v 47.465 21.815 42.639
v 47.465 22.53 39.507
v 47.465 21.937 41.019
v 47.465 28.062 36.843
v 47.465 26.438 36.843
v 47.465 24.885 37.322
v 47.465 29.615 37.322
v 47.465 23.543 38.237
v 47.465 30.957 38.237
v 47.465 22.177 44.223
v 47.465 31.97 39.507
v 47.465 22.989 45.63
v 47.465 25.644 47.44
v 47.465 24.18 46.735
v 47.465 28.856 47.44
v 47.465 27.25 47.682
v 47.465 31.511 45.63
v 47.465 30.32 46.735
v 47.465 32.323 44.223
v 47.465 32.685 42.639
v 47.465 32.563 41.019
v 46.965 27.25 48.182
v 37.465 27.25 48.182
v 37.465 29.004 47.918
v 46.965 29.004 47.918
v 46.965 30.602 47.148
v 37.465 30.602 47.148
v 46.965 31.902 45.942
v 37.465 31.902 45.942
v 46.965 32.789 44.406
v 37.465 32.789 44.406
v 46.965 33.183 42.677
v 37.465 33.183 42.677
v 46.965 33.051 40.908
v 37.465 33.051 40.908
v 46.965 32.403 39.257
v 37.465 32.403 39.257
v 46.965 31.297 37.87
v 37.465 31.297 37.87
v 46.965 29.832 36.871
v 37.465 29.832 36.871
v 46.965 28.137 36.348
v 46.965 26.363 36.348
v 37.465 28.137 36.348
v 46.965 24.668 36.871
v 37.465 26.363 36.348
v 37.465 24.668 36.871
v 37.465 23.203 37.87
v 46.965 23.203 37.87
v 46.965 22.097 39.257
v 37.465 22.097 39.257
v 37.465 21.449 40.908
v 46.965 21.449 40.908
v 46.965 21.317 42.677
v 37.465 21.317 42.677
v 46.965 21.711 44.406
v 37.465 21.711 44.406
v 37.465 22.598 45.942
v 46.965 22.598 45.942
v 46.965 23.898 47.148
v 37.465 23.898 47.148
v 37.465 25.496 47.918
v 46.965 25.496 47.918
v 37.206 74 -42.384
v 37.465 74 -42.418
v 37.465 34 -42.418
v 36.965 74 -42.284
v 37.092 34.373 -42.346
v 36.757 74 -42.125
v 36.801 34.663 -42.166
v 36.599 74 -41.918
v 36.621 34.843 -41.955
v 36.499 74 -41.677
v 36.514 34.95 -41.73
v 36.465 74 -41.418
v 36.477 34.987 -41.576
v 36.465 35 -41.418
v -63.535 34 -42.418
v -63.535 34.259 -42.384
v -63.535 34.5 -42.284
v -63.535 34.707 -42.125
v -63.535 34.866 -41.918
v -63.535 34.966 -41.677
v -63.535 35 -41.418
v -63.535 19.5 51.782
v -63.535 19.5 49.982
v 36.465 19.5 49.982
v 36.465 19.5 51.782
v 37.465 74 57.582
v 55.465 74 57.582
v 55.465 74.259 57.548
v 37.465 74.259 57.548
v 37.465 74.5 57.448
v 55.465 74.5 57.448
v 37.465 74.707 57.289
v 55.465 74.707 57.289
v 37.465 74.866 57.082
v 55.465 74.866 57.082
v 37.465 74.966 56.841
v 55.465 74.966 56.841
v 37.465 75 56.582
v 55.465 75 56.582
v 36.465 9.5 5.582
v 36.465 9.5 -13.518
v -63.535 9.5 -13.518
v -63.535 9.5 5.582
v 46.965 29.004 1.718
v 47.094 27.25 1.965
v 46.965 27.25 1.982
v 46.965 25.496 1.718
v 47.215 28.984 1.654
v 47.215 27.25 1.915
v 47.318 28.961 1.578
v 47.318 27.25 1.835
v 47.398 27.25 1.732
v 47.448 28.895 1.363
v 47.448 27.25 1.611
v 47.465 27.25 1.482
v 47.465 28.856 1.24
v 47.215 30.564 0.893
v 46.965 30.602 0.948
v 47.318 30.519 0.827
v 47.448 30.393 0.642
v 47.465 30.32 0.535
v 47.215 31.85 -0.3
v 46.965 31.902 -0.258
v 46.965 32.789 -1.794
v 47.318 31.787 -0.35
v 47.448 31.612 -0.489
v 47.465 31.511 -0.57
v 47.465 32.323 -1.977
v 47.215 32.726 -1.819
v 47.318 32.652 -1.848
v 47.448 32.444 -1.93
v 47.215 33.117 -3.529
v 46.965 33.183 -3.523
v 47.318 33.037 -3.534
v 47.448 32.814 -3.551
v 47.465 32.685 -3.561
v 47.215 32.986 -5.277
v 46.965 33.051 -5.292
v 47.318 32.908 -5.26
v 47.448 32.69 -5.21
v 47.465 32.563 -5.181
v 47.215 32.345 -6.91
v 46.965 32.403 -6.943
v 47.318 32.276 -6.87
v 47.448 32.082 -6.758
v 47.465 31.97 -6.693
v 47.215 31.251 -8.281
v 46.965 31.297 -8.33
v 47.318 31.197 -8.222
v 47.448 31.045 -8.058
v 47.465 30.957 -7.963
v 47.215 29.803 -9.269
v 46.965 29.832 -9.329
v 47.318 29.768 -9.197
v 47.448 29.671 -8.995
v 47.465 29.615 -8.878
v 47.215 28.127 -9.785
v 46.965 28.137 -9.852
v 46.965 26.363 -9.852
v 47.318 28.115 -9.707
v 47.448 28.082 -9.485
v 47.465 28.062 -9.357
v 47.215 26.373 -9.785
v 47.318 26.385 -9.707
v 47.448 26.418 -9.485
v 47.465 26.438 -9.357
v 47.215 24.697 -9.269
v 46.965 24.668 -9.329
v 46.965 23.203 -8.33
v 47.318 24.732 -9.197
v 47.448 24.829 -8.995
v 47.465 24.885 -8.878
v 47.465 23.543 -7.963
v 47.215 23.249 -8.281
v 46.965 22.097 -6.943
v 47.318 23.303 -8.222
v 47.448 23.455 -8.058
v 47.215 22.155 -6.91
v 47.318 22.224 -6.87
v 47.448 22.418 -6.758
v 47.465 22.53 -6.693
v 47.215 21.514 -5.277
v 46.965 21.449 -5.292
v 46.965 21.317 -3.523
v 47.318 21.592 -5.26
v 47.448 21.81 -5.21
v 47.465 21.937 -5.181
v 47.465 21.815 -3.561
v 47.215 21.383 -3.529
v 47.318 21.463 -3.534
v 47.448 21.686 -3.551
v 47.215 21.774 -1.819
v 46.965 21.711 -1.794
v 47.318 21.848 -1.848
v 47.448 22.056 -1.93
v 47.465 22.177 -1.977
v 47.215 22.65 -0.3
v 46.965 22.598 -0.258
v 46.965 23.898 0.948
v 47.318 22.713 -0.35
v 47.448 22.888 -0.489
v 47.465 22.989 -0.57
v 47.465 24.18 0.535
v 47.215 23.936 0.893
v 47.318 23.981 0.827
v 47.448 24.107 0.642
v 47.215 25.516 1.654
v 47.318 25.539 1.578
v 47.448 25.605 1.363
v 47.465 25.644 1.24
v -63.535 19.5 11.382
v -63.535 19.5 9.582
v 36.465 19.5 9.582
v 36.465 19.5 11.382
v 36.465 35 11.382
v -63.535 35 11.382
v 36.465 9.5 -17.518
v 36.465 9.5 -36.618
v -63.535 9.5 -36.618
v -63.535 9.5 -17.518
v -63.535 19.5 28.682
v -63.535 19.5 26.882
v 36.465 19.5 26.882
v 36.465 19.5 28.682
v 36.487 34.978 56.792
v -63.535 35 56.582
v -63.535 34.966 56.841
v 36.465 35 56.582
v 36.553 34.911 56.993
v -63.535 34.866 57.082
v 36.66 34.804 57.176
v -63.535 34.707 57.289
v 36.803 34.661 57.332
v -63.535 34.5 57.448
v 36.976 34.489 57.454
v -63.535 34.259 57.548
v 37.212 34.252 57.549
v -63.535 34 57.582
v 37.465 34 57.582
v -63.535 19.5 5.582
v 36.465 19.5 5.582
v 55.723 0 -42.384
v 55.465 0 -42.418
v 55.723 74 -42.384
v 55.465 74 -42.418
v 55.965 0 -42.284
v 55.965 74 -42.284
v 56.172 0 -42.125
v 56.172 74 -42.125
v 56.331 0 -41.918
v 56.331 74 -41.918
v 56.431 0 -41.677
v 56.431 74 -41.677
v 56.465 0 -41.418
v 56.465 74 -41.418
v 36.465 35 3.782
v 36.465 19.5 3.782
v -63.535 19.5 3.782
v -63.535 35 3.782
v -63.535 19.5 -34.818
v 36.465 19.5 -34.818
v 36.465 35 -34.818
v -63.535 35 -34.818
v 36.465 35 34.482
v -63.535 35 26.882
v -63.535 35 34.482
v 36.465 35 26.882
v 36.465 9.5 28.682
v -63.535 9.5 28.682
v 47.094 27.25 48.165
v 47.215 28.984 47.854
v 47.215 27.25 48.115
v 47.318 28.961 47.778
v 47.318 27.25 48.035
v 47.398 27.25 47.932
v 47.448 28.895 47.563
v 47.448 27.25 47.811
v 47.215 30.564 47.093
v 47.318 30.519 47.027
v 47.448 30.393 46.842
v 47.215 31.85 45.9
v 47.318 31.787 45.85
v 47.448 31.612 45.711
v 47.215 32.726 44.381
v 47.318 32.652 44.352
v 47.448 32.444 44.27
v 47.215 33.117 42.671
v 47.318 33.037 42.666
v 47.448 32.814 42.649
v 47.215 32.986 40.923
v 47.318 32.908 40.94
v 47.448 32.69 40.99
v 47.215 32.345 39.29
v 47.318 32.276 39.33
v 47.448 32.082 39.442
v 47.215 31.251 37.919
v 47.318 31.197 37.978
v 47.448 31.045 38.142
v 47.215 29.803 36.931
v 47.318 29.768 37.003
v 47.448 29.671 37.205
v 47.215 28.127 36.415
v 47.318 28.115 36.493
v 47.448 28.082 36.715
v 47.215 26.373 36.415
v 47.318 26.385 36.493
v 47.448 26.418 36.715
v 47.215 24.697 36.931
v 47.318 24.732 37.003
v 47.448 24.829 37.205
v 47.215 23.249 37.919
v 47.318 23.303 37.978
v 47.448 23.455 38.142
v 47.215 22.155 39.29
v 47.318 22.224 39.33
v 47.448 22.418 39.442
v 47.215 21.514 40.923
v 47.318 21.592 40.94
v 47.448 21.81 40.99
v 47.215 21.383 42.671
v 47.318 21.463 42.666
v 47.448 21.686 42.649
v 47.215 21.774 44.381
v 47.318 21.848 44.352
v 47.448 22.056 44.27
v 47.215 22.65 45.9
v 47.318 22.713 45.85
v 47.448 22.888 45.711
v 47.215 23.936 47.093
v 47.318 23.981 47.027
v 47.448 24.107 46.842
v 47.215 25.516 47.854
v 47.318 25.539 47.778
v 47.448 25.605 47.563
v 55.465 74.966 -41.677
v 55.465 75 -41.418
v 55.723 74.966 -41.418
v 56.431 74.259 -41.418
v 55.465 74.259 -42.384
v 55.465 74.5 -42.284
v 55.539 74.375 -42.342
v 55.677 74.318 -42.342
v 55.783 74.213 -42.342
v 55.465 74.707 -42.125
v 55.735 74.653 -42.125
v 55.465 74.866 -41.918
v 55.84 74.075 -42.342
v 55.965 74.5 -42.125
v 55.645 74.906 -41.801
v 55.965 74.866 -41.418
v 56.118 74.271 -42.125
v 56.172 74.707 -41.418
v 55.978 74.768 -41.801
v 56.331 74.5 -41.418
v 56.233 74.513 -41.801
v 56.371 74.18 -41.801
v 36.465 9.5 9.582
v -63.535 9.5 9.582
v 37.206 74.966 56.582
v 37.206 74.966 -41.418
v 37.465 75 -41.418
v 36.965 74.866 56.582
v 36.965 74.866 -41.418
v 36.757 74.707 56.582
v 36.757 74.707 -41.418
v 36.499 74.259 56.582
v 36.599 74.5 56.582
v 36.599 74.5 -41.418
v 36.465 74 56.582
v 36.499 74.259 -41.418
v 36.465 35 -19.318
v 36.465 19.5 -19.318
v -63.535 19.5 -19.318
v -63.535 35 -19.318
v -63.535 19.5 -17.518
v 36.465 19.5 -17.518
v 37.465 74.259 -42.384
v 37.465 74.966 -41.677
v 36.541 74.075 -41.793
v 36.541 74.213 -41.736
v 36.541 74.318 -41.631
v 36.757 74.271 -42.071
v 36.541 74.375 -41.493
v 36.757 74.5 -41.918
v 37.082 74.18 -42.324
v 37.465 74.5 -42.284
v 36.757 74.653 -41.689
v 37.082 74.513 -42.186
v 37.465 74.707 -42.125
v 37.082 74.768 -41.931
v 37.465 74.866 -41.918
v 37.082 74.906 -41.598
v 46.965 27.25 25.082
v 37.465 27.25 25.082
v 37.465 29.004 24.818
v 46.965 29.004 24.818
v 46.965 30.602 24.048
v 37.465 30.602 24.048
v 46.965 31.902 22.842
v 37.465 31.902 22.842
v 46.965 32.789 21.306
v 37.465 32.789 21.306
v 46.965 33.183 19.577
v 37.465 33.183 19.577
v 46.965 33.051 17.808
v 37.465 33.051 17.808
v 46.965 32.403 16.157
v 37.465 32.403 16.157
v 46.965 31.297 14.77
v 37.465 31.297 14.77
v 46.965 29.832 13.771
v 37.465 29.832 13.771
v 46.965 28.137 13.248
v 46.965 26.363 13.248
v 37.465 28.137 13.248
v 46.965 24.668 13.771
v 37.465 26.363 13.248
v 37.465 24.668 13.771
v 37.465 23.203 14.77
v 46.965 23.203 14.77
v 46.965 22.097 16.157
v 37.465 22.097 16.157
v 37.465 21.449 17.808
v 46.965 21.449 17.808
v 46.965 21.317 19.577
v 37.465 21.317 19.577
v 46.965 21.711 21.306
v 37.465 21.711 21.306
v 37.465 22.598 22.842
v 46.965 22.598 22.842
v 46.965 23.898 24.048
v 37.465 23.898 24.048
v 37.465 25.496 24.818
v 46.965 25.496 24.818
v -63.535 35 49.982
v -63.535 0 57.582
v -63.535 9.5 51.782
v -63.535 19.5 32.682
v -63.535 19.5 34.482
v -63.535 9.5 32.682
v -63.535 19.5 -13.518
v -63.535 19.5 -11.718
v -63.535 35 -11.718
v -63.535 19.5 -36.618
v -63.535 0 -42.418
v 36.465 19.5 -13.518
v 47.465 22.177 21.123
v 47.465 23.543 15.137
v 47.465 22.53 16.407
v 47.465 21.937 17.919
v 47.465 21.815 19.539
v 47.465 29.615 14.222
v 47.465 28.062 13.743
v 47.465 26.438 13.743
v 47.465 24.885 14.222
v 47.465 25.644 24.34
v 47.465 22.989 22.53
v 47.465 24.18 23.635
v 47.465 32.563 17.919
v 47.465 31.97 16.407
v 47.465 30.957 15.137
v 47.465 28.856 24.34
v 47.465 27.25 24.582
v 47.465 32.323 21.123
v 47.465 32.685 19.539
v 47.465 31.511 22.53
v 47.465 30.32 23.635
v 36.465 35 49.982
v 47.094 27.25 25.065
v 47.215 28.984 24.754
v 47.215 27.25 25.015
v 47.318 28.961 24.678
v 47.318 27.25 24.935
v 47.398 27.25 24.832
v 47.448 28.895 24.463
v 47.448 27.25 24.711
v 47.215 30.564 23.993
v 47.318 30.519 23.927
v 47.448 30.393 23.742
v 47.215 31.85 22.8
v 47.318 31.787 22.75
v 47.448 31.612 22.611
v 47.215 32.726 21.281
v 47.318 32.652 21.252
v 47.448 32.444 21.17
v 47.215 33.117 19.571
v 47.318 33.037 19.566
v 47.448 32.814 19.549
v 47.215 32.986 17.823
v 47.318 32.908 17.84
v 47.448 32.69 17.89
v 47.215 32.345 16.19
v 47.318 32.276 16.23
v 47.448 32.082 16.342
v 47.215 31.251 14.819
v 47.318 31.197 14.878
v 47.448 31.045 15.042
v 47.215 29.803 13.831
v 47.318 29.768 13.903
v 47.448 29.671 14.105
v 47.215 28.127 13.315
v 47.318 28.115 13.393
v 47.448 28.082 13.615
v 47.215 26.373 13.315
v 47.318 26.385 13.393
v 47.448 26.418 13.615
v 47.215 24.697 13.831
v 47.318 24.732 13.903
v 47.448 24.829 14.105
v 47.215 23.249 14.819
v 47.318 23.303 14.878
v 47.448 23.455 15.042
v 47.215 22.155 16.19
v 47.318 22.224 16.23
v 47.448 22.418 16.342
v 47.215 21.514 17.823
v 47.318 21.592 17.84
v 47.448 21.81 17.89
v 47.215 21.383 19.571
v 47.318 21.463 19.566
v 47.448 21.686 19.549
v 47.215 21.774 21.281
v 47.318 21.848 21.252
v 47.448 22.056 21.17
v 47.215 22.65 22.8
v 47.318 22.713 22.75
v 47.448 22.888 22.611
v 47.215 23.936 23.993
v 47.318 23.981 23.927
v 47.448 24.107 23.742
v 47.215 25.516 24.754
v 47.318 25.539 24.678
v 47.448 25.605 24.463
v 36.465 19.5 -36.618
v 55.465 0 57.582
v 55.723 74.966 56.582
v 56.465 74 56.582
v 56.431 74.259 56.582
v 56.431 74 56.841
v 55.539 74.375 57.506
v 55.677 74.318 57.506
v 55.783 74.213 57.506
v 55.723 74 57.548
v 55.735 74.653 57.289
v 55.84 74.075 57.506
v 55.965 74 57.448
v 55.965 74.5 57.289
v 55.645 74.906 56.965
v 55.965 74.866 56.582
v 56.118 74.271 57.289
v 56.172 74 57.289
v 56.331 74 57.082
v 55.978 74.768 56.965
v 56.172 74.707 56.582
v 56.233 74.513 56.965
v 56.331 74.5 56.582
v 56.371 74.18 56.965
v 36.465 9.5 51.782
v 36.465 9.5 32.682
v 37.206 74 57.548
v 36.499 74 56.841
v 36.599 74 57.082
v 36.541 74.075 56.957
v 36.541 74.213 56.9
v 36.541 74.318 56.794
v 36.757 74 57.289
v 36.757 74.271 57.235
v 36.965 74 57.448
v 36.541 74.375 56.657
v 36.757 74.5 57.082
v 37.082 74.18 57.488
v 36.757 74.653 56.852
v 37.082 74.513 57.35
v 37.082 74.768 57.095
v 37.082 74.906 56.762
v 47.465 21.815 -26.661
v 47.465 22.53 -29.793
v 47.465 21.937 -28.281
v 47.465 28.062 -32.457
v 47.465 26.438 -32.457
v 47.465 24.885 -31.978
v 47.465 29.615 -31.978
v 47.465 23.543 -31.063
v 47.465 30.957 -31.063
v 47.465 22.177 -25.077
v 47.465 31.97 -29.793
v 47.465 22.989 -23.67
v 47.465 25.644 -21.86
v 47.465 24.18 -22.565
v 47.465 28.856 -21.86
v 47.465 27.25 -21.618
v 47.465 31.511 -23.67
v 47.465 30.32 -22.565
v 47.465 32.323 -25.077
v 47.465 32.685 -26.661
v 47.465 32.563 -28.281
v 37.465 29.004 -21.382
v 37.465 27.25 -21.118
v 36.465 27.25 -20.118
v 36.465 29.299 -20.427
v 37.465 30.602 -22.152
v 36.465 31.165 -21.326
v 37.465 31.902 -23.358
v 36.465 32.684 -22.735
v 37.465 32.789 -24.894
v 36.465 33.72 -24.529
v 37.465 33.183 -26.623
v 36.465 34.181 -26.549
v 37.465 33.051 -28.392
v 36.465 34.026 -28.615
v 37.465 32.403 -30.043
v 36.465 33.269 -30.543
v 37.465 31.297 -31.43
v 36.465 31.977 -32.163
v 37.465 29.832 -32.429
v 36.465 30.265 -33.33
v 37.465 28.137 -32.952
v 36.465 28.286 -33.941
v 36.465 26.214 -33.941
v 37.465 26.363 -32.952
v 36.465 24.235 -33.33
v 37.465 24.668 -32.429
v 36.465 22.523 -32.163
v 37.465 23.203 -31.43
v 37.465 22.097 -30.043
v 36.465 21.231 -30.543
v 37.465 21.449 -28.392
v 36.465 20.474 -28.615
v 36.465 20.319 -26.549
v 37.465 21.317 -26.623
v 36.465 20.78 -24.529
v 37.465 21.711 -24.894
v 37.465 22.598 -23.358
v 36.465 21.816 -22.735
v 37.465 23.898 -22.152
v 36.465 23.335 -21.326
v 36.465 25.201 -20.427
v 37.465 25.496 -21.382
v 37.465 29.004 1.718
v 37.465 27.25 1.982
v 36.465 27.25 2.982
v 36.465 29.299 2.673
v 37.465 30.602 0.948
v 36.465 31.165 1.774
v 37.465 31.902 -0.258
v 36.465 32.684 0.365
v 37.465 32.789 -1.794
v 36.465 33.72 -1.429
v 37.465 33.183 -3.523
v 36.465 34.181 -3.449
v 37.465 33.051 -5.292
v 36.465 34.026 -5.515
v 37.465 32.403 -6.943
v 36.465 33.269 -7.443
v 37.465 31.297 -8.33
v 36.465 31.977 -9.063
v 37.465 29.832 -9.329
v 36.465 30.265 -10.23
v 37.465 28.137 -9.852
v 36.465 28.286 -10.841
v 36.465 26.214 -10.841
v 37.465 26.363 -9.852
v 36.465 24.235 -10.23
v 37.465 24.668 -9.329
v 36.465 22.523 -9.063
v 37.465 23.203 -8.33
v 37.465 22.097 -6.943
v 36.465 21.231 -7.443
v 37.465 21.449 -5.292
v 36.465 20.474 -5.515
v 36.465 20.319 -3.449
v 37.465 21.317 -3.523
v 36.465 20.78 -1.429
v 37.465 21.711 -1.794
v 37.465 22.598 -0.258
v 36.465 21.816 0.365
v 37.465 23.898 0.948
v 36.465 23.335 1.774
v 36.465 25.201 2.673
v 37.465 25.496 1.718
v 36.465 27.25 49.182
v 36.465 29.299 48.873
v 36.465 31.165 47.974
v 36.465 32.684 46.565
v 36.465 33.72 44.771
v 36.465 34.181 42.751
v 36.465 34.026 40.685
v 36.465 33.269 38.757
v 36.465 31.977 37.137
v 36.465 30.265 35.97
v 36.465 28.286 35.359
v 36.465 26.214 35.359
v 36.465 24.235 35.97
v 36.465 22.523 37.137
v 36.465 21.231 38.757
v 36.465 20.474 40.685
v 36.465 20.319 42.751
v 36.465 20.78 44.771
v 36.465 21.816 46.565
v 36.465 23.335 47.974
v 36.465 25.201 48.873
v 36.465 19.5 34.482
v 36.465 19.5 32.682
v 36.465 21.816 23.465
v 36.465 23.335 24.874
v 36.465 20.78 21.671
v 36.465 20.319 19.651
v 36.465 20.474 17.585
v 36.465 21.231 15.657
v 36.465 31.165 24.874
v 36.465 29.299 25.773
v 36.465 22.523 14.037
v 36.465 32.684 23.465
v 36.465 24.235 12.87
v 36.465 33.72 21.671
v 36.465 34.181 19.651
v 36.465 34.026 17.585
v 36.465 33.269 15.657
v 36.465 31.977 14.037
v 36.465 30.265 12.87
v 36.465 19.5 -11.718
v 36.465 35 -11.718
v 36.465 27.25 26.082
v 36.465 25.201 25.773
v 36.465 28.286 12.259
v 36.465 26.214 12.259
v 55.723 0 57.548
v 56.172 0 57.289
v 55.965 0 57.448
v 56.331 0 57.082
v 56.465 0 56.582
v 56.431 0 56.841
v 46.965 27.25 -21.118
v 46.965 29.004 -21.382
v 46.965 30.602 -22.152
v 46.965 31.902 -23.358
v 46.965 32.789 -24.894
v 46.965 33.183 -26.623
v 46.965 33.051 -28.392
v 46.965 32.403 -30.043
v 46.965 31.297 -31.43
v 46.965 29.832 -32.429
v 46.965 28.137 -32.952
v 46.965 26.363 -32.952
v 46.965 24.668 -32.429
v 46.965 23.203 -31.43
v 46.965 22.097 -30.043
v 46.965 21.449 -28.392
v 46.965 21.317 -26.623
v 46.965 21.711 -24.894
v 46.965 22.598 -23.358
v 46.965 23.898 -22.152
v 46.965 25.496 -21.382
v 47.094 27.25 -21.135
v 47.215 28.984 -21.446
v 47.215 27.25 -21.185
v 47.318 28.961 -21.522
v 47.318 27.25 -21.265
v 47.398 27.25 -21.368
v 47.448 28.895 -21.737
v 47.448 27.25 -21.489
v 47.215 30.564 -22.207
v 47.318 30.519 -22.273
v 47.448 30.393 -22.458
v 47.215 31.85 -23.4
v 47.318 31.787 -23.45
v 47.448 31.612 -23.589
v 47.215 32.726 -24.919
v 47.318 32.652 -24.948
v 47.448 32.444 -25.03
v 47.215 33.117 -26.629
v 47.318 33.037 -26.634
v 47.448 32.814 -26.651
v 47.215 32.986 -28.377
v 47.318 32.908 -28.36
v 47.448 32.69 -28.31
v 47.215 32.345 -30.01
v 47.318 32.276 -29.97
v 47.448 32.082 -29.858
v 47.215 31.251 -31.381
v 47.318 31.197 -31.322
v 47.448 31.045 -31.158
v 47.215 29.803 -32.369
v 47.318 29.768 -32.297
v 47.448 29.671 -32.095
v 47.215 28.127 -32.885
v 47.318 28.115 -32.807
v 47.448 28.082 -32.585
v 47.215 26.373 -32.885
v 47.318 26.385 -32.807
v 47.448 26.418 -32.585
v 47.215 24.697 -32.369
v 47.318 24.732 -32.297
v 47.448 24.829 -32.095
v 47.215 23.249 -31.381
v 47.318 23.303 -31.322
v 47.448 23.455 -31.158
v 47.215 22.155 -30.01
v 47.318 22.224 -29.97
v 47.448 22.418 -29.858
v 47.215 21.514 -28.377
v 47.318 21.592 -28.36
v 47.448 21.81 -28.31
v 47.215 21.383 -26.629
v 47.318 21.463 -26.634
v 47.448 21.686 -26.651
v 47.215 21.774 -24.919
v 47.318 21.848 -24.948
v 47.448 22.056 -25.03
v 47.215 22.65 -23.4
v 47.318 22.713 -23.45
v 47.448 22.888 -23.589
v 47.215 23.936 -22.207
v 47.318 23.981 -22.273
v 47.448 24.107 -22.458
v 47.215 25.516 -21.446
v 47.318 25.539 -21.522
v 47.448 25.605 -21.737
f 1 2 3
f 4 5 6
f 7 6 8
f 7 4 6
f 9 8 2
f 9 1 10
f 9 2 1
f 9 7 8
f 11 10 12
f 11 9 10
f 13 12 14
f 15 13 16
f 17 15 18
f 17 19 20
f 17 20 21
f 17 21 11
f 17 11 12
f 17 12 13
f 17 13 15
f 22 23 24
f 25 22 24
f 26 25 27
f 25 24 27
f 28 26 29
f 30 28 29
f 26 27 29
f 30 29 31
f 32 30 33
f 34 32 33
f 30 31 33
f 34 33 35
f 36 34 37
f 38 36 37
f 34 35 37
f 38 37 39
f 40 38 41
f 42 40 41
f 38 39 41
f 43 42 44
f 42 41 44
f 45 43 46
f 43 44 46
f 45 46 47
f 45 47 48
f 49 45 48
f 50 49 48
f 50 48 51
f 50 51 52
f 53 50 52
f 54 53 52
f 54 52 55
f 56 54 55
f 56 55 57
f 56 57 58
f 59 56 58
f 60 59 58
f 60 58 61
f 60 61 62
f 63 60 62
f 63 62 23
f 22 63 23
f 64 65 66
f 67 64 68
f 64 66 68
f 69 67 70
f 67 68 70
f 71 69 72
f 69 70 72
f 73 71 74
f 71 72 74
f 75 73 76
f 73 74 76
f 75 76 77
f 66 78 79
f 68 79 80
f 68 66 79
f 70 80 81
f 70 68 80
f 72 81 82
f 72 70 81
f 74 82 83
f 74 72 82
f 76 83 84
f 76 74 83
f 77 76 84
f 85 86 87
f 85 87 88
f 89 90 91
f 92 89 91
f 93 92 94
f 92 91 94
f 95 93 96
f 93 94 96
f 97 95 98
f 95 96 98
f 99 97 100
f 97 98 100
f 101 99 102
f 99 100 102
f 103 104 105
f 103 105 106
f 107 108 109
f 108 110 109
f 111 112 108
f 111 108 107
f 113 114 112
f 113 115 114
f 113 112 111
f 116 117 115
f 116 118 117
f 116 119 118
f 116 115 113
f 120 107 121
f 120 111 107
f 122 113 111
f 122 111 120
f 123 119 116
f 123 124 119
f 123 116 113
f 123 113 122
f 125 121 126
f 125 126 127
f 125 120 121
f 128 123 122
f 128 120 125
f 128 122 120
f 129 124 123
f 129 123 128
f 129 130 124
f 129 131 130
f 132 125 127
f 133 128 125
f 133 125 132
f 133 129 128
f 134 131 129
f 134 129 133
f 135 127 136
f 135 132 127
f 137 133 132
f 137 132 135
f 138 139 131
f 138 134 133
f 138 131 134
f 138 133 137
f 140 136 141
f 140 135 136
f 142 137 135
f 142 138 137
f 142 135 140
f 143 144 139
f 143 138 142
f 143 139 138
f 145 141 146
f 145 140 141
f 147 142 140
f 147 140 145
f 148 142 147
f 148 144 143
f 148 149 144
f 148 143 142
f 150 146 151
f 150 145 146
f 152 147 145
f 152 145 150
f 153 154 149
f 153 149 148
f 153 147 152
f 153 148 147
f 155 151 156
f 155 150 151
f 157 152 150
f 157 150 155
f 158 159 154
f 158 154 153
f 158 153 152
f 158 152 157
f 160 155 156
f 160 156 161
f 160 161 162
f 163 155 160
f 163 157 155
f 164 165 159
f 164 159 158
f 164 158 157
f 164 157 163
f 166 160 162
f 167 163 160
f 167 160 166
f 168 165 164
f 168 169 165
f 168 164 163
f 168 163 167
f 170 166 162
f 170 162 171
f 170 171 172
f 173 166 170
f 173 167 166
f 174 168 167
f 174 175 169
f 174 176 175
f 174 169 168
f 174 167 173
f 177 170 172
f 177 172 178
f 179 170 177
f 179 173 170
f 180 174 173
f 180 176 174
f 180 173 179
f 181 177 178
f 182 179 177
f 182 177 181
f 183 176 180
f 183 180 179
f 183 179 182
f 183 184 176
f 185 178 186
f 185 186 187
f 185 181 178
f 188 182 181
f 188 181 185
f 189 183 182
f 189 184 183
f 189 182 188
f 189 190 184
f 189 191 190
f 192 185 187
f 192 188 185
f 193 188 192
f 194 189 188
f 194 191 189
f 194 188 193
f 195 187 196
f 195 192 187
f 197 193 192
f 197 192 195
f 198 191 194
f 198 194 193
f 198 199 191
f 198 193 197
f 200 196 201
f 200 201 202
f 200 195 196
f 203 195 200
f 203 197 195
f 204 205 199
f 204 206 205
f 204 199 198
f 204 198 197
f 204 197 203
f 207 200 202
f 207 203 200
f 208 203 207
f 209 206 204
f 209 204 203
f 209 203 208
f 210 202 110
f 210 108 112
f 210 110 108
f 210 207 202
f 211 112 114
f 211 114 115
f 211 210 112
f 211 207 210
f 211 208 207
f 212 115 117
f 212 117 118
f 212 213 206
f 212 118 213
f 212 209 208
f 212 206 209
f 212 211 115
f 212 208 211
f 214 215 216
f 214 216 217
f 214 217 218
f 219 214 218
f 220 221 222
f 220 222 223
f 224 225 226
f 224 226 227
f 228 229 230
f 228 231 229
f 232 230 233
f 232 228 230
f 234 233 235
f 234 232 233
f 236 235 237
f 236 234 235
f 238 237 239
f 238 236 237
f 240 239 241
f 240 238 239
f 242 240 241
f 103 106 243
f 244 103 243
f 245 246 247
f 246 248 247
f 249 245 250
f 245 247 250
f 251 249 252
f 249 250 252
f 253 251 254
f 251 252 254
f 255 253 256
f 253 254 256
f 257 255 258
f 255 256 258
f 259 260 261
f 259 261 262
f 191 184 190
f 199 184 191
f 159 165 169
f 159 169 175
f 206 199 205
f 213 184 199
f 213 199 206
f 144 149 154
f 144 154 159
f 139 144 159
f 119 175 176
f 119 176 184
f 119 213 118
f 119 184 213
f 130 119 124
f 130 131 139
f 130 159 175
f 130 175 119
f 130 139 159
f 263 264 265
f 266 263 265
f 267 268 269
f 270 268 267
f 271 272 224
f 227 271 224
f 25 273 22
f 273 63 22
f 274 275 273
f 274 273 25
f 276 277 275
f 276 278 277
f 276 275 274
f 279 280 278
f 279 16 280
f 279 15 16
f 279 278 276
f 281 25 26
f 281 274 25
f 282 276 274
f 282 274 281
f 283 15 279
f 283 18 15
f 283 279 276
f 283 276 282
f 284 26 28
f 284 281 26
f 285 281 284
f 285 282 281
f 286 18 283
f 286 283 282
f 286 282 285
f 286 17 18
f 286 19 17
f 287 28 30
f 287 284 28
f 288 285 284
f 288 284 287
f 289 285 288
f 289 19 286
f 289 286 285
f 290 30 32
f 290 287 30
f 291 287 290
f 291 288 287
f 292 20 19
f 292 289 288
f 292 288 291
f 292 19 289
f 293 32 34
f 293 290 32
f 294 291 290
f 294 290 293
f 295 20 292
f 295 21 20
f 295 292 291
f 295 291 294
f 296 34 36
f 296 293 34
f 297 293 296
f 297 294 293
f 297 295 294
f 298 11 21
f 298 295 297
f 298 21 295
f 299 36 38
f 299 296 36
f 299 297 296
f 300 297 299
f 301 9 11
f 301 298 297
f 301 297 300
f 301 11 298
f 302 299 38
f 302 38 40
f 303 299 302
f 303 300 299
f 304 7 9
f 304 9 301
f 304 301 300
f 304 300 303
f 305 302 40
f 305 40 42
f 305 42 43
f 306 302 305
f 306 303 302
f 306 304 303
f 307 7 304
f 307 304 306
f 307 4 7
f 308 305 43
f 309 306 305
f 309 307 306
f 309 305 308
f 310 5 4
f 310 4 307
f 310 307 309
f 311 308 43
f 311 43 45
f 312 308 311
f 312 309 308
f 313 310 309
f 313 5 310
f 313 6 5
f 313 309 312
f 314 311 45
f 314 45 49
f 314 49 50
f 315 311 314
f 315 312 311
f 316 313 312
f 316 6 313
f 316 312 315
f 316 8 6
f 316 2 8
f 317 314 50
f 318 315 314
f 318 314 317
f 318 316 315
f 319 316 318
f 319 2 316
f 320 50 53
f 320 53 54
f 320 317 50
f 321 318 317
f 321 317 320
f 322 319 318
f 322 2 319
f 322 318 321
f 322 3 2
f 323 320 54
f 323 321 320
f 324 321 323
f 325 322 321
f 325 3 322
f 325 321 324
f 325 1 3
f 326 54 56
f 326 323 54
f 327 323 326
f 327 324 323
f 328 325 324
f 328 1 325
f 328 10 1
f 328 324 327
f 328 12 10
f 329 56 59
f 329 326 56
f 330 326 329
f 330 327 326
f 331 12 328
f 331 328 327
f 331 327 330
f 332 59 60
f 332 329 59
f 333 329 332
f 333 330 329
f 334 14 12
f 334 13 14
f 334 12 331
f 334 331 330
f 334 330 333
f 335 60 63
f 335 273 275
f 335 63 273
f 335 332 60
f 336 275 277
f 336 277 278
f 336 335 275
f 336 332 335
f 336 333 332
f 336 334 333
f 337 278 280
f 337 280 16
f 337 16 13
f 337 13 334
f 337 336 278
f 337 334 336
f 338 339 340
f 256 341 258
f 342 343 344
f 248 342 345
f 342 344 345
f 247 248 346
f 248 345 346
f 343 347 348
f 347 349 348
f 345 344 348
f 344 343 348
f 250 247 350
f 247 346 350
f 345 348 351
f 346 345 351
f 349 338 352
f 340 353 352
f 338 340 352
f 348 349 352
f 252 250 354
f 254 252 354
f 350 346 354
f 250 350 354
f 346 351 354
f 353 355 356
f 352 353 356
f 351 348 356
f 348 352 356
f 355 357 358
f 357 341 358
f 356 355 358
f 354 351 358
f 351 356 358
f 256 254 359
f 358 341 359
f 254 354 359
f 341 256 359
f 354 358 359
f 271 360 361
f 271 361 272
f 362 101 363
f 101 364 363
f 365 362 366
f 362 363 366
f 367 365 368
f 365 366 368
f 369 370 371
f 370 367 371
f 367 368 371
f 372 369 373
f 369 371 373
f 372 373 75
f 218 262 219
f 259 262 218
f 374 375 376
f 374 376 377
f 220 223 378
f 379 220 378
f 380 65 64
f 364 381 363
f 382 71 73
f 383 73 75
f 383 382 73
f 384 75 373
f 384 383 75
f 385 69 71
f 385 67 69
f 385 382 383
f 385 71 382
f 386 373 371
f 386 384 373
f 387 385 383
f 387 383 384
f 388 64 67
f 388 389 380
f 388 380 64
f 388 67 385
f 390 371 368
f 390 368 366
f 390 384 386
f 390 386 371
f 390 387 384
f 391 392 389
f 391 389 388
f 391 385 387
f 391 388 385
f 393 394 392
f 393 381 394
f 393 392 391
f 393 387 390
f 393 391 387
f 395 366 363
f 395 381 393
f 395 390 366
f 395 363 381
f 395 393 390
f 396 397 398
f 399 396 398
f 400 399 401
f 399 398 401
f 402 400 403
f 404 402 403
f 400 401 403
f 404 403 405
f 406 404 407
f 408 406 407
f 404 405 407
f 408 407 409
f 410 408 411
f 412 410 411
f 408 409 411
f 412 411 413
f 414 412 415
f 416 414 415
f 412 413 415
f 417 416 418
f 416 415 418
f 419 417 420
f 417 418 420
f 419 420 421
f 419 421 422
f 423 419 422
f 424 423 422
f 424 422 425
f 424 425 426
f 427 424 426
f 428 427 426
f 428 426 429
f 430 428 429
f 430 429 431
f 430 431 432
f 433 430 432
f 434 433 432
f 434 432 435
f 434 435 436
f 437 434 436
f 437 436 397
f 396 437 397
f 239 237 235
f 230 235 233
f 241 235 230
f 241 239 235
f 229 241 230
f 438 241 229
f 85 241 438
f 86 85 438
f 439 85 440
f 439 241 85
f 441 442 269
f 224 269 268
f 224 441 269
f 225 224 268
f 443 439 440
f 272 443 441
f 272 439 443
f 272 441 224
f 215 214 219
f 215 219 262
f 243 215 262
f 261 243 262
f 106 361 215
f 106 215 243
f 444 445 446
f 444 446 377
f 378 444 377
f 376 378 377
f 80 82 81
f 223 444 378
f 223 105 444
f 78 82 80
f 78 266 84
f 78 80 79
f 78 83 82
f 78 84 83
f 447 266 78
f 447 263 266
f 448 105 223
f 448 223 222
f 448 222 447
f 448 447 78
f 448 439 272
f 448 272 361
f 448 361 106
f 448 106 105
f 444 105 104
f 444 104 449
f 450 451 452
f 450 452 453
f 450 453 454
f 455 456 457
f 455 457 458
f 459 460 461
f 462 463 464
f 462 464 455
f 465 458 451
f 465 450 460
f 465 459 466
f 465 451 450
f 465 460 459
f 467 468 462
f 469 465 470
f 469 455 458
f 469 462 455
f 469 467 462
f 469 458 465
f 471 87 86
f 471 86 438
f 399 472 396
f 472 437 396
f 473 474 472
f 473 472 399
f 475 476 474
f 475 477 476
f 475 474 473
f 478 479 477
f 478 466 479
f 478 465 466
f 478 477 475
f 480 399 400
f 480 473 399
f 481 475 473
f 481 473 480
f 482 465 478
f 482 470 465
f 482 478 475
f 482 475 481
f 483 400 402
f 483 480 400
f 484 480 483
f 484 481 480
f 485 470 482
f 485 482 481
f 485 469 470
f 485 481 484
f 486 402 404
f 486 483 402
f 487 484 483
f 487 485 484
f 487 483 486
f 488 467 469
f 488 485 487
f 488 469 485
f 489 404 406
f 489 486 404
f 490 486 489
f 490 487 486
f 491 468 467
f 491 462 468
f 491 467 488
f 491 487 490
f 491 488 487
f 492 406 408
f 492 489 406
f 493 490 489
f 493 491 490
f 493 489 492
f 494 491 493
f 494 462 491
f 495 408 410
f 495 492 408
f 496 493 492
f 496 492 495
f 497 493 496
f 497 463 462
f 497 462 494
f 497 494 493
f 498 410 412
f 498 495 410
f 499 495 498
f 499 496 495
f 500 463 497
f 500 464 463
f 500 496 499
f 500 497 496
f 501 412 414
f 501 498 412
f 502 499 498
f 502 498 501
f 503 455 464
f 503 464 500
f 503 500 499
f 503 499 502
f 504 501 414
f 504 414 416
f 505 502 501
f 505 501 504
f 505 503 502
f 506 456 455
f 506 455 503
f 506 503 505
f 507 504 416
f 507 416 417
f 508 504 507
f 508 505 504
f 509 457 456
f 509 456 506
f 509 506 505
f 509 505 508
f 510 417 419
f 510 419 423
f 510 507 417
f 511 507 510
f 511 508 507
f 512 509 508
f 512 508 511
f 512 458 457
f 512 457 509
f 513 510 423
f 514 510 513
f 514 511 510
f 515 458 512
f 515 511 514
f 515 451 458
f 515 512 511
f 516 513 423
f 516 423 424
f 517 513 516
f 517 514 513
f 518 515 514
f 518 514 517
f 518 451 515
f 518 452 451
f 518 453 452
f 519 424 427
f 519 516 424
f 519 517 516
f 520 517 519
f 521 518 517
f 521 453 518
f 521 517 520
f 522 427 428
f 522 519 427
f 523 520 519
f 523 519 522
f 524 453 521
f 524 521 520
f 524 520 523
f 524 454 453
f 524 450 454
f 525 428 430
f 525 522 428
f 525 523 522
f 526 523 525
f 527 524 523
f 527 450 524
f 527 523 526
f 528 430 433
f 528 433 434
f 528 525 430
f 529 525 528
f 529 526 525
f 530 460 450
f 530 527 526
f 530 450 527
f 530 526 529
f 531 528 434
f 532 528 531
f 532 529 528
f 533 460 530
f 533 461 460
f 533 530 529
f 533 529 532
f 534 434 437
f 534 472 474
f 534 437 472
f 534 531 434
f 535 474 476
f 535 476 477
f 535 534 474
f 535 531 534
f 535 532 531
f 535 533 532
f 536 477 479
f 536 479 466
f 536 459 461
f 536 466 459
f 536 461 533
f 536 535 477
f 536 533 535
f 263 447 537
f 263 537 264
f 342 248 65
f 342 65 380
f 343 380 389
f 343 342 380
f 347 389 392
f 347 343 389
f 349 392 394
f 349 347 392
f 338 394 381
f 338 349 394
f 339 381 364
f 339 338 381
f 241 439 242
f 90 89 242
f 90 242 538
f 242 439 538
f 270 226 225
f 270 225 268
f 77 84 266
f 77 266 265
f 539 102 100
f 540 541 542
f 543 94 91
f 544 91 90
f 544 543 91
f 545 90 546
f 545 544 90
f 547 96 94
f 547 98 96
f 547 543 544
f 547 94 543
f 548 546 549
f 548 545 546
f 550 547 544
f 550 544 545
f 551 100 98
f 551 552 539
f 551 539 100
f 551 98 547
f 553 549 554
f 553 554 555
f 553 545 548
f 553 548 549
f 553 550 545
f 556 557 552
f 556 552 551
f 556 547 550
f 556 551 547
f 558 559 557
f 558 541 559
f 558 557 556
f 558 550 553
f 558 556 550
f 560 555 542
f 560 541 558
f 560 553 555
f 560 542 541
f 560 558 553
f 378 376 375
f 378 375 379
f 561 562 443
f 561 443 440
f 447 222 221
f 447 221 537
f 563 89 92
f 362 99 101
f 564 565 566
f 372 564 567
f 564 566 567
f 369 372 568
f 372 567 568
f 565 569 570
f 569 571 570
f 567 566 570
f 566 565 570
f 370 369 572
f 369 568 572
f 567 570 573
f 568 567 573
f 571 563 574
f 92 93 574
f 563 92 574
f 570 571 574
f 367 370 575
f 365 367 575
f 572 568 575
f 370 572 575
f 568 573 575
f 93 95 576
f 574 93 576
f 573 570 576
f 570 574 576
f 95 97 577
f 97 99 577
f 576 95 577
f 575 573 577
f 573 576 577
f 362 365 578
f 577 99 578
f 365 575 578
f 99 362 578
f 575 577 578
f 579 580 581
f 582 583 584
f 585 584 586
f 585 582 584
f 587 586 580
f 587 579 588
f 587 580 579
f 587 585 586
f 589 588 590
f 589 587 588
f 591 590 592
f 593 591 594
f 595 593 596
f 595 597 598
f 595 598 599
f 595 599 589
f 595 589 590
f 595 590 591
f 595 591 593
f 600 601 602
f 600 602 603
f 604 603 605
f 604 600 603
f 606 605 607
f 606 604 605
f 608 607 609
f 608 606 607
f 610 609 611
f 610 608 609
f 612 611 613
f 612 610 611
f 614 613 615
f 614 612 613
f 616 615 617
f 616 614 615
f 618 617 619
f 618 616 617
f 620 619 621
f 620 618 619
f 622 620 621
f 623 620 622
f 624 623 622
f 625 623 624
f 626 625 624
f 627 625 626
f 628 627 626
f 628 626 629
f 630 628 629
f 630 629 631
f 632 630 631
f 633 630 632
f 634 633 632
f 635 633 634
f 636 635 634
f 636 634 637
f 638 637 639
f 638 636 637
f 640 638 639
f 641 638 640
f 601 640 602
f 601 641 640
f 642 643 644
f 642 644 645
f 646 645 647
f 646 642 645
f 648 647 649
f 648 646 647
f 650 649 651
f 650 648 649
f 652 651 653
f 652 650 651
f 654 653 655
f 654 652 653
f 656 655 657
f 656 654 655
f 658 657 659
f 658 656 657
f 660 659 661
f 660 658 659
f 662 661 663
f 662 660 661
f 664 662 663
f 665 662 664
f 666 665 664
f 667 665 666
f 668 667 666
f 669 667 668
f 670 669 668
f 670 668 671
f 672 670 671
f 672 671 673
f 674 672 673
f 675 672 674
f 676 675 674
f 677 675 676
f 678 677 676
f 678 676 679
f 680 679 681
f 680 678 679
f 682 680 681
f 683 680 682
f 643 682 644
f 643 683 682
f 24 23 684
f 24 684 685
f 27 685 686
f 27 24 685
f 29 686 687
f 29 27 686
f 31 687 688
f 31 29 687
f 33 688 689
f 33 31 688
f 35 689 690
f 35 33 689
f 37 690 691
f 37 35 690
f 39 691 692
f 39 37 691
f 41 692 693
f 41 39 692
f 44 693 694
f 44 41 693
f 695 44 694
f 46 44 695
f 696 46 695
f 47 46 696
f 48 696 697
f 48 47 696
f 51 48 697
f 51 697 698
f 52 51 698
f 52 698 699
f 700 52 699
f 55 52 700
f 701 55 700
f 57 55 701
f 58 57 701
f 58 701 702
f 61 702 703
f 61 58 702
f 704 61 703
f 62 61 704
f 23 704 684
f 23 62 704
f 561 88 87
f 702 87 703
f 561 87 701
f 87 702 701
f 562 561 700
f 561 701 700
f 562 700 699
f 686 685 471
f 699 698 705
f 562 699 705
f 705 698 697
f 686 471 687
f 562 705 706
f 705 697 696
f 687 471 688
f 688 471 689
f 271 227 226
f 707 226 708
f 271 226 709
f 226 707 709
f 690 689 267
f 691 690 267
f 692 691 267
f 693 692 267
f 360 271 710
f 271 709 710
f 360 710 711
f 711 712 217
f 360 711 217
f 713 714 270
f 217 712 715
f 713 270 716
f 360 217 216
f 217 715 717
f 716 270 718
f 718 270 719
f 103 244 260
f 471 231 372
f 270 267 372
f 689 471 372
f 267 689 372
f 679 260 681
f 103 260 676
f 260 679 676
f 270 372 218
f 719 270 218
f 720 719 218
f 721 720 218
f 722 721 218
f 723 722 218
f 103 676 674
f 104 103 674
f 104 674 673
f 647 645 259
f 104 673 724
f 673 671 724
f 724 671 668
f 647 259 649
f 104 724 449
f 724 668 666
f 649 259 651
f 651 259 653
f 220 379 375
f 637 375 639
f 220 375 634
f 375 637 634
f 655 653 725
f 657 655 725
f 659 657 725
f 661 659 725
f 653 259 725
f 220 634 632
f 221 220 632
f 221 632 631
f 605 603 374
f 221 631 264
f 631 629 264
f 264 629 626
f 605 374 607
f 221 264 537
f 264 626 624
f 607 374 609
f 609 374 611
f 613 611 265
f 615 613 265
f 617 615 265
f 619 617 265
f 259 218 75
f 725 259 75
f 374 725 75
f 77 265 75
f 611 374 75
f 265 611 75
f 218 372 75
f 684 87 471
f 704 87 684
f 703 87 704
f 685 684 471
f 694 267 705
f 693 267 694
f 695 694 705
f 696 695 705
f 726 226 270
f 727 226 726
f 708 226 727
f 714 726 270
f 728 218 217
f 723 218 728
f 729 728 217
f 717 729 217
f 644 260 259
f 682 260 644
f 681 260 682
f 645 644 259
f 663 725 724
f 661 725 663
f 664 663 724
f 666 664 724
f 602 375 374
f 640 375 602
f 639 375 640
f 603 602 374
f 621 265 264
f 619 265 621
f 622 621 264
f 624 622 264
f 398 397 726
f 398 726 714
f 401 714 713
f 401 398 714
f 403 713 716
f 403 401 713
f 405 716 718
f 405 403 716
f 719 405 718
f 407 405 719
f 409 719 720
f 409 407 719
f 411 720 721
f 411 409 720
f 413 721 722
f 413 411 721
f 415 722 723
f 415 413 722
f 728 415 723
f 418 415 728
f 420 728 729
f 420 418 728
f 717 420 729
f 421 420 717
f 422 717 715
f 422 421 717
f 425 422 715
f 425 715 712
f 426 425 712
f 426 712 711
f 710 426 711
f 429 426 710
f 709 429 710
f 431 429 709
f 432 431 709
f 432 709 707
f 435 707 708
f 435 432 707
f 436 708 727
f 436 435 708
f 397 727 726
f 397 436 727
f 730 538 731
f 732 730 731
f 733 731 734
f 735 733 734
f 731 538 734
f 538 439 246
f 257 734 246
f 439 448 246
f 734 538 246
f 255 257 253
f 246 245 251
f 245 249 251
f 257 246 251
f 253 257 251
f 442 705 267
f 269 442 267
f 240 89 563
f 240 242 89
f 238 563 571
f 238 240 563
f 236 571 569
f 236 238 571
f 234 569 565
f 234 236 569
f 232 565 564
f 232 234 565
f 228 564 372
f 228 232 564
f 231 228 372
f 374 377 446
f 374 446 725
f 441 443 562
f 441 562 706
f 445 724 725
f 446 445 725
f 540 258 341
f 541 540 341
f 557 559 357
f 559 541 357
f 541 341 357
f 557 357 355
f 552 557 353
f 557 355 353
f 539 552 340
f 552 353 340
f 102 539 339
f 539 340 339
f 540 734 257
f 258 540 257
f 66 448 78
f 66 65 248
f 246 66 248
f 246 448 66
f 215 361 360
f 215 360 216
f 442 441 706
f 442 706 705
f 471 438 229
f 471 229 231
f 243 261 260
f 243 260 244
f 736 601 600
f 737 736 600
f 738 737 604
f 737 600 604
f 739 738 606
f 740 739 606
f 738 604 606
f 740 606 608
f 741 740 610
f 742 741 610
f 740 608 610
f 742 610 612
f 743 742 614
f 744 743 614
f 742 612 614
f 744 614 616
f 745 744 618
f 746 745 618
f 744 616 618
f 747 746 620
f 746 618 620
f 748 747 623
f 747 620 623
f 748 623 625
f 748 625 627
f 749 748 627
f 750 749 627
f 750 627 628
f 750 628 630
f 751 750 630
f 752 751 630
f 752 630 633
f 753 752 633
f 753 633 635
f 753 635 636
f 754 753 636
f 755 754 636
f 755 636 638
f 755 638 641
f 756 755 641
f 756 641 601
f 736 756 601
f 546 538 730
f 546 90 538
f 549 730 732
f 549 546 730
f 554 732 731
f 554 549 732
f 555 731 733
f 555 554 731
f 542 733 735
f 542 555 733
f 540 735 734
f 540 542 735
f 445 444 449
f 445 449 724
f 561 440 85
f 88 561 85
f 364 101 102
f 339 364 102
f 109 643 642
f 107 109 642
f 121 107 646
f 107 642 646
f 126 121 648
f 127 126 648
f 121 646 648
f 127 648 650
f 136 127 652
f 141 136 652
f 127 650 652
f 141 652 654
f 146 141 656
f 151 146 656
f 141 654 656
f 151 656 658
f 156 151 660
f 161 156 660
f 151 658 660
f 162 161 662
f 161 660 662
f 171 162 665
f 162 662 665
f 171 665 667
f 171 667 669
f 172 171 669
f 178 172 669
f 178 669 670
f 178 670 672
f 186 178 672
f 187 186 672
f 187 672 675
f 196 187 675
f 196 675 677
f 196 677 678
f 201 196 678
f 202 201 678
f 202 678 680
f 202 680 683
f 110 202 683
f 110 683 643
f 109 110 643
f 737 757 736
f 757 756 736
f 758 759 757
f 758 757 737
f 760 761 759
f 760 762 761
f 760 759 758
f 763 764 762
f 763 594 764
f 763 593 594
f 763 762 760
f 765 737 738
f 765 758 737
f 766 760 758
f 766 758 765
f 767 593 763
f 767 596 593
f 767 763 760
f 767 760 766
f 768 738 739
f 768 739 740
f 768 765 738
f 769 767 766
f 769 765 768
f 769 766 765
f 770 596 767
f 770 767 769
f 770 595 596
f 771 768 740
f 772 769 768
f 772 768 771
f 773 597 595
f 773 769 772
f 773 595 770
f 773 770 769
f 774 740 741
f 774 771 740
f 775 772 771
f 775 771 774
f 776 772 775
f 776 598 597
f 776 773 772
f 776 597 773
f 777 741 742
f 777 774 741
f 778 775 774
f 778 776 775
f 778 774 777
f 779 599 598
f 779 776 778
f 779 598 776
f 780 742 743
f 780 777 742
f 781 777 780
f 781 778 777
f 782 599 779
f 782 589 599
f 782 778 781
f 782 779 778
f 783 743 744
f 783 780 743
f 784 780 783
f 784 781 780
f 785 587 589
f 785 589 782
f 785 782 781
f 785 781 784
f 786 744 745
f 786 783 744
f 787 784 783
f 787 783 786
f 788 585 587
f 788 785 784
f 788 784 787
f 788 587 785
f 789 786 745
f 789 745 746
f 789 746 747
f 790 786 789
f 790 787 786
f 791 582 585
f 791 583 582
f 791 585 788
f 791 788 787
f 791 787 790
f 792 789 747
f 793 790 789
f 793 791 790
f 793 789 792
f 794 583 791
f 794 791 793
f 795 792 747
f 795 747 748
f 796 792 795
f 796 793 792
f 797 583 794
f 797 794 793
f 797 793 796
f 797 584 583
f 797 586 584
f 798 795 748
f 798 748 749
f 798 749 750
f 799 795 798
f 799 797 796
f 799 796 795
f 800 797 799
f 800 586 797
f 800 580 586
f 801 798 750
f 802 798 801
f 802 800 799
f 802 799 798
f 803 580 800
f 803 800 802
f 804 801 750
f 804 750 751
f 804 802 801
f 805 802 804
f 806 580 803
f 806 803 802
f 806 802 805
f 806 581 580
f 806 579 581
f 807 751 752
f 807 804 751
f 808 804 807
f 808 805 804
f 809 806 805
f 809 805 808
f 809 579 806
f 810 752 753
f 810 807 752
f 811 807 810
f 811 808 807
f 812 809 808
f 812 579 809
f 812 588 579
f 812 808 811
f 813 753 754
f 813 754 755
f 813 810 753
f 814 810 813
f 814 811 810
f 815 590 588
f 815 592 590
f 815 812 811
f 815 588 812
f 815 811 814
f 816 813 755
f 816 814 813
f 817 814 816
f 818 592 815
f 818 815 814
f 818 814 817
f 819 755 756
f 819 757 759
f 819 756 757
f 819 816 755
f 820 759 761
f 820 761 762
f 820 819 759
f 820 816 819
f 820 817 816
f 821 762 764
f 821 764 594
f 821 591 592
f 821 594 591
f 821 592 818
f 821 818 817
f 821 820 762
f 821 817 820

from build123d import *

# Parameters (mm, degrees)
SKETCH1_W           = 120
SKETCH1_H           = 100
BOSS_EXTRUDE1_DEPTH = 75
SKETCH2_W           = 100
SKETCH2_H           = 100
CUT_EXTRUDE1_DEPTH  = 40
SKETCH6_W           = 15.5
SKETCH6_H           = 15.5
CUT_EXTRUDE4_DEPTH  = 100
SKETCH8_W           = 19.1
SKETCH8_H           = 10
CUT_EXTRUDE5_DEPTH  = 100
SKETCH6_3_R         = 5.95
CUT_EXTRUDE6_DEPTH  = 111
FILLET1_R           = 1
CHAMFER1_SIZE       = 1
FILLET2_R           = 0.5


with BuildPart() as part:
    # Sketch1 → Boss-Extrude1 (new body)
    with BuildSketch(Plane(origin=(0, 0, 0), x_dir=(1, 0, 0), z_dir=(0, 1, 0))):
        with Locations((-3.53539823, -7.581858407)):
            Rectangle(SKETCH1_W, SKETCH1_H)
    extrude(amount=BOSS_EXTRUDE1_DEPTH)

    # Sketch2 → Cut-Extrude1 (cut)
    with BuildSketch(Plane(origin=(0, 75, 0), x_dir=(1, 0, 0), z_dir=(0, 1, 0))):
        with Locations((-13.53539823, -7.581858407)):
            Rectangle(SKETCH2_W, SKETCH2_H)
    extrude(amount=-CUT_EXTRUDE1_DEPTH, mode=Mode.SUBTRACT)

    # Sketch6 → Cut-Extrude4 (cut)
    with BuildSketch(Plane.ZY.offset(63.53539823)):
        with Locations((-27.068141593, 27.25)):
            Rectangle(SKETCH6_W, SKETCH6_H)
        with Locations((-3.968141593, 27.25)):
            Rectangle(SKETCH6_W, SKETCH6_H)
        with Locations((19.131858407, 27.25)):
            Rectangle(SKETCH6_W, SKETCH6_H)
        with Locations((42.231858407, 27.25)):
            Rectangle(SKETCH6_W, SKETCH6_H)
    extrude(amount=-CUT_EXTRUDE4_DEPTH, mode=Mode.SUBTRACT)

    # Sketch8 → Cut-Extrude5 (cut)
    with BuildSketch(Plane.ZY.offset(63.53539823)):
        with Locations((-27.068141593, 14.5)):
            Rectangle(SKETCH8_W, SKETCH8_H)
        with Locations((-3.968141593, 14.5)):
            Rectangle(SKETCH8_W, SKETCH8_H)
        with Locations((42.231858407, 14.5)):
            Rectangle(SKETCH8_W, SKETCH8_H)
        with Locations((19.131858407, 14.5)):
            Rectangle(SKETCH8_W, SKETCH8_H)
    extrude(amount=-CUT_EXTRUDE5_DEPTH, mode=Mode.SUBTRACT)

    # Sketch6<3> → Cut-Extrude6 (cut)
    with BuildSketch(Plane.ZY.offset(63.53539823)):
        with Locations((-27.068141593, 27.25)):
            Circle(SKETCH6_3_R)
        with Locations((-3.968141593, 27.25)):
            Circle(SKETCH6_3_R)
        with Locations((42.231858407, 27.25)):
            Circle(SKETCH6_3_R)
        with Locations((19.131858407, 27.25)):
            Circle(SKETCH6_3_R)
    extrude(amount=-CUT_EXTRUDE6_DEPTH, mode=Mode.SUBTRACT)

    # Fillet1
    fillet1_edges = [part.edges().sort_by_distance(p)[0] for p in [
        (56.46460177, 75, 7.581858407),
        (46.46460177, 75, 57.581858407),
        (46.46460177, 75, -42.418141593),
        (-13.53539823, 35, -42.418141593),
        (36.46460177, 55, -42.418141593),
        (-13.53539823, 35, 57.581858407),
        (36.46460177, 55, 57.581858407),
        (36.46460177, 75, 7.581858407),
        (56.46460177, 37.5, -42.418141593),
        (56.46460177, 37.5, 57.581858407),
    ]]
    fillet(fillet1_edges, radius=FILLET1_R)

    # Chamfer1
    chamfer1_edges = [part.edges().sort_by_distance(p)[0] for p in [
        (36.46460177, 27.25, -33.018141593),
        (36.46460177, 27.25, -9.918141593),
        (36.46460177, 27.25, 13.181858407),
        (36.46460177, 27.25, 36.281858407),
    ]]
    chamfer(chamfer1_edges, length=CHAMFER1_SIZE)

    # Fillet2
    fillet2_edges = [part.edges().sort_by_distance(p)[0] for p in [
        (47.46460177, 27.25, -33.018141593),
        (47.46460177, 27.25, -9.918141593),
        (47.46460177, 27.25, 13.181858407),
        (47.46460177, 27.25, 36.281858407),
    ]]
    fillet(fillet2_edges, radius=FILLET2_R)


solid = part.part
